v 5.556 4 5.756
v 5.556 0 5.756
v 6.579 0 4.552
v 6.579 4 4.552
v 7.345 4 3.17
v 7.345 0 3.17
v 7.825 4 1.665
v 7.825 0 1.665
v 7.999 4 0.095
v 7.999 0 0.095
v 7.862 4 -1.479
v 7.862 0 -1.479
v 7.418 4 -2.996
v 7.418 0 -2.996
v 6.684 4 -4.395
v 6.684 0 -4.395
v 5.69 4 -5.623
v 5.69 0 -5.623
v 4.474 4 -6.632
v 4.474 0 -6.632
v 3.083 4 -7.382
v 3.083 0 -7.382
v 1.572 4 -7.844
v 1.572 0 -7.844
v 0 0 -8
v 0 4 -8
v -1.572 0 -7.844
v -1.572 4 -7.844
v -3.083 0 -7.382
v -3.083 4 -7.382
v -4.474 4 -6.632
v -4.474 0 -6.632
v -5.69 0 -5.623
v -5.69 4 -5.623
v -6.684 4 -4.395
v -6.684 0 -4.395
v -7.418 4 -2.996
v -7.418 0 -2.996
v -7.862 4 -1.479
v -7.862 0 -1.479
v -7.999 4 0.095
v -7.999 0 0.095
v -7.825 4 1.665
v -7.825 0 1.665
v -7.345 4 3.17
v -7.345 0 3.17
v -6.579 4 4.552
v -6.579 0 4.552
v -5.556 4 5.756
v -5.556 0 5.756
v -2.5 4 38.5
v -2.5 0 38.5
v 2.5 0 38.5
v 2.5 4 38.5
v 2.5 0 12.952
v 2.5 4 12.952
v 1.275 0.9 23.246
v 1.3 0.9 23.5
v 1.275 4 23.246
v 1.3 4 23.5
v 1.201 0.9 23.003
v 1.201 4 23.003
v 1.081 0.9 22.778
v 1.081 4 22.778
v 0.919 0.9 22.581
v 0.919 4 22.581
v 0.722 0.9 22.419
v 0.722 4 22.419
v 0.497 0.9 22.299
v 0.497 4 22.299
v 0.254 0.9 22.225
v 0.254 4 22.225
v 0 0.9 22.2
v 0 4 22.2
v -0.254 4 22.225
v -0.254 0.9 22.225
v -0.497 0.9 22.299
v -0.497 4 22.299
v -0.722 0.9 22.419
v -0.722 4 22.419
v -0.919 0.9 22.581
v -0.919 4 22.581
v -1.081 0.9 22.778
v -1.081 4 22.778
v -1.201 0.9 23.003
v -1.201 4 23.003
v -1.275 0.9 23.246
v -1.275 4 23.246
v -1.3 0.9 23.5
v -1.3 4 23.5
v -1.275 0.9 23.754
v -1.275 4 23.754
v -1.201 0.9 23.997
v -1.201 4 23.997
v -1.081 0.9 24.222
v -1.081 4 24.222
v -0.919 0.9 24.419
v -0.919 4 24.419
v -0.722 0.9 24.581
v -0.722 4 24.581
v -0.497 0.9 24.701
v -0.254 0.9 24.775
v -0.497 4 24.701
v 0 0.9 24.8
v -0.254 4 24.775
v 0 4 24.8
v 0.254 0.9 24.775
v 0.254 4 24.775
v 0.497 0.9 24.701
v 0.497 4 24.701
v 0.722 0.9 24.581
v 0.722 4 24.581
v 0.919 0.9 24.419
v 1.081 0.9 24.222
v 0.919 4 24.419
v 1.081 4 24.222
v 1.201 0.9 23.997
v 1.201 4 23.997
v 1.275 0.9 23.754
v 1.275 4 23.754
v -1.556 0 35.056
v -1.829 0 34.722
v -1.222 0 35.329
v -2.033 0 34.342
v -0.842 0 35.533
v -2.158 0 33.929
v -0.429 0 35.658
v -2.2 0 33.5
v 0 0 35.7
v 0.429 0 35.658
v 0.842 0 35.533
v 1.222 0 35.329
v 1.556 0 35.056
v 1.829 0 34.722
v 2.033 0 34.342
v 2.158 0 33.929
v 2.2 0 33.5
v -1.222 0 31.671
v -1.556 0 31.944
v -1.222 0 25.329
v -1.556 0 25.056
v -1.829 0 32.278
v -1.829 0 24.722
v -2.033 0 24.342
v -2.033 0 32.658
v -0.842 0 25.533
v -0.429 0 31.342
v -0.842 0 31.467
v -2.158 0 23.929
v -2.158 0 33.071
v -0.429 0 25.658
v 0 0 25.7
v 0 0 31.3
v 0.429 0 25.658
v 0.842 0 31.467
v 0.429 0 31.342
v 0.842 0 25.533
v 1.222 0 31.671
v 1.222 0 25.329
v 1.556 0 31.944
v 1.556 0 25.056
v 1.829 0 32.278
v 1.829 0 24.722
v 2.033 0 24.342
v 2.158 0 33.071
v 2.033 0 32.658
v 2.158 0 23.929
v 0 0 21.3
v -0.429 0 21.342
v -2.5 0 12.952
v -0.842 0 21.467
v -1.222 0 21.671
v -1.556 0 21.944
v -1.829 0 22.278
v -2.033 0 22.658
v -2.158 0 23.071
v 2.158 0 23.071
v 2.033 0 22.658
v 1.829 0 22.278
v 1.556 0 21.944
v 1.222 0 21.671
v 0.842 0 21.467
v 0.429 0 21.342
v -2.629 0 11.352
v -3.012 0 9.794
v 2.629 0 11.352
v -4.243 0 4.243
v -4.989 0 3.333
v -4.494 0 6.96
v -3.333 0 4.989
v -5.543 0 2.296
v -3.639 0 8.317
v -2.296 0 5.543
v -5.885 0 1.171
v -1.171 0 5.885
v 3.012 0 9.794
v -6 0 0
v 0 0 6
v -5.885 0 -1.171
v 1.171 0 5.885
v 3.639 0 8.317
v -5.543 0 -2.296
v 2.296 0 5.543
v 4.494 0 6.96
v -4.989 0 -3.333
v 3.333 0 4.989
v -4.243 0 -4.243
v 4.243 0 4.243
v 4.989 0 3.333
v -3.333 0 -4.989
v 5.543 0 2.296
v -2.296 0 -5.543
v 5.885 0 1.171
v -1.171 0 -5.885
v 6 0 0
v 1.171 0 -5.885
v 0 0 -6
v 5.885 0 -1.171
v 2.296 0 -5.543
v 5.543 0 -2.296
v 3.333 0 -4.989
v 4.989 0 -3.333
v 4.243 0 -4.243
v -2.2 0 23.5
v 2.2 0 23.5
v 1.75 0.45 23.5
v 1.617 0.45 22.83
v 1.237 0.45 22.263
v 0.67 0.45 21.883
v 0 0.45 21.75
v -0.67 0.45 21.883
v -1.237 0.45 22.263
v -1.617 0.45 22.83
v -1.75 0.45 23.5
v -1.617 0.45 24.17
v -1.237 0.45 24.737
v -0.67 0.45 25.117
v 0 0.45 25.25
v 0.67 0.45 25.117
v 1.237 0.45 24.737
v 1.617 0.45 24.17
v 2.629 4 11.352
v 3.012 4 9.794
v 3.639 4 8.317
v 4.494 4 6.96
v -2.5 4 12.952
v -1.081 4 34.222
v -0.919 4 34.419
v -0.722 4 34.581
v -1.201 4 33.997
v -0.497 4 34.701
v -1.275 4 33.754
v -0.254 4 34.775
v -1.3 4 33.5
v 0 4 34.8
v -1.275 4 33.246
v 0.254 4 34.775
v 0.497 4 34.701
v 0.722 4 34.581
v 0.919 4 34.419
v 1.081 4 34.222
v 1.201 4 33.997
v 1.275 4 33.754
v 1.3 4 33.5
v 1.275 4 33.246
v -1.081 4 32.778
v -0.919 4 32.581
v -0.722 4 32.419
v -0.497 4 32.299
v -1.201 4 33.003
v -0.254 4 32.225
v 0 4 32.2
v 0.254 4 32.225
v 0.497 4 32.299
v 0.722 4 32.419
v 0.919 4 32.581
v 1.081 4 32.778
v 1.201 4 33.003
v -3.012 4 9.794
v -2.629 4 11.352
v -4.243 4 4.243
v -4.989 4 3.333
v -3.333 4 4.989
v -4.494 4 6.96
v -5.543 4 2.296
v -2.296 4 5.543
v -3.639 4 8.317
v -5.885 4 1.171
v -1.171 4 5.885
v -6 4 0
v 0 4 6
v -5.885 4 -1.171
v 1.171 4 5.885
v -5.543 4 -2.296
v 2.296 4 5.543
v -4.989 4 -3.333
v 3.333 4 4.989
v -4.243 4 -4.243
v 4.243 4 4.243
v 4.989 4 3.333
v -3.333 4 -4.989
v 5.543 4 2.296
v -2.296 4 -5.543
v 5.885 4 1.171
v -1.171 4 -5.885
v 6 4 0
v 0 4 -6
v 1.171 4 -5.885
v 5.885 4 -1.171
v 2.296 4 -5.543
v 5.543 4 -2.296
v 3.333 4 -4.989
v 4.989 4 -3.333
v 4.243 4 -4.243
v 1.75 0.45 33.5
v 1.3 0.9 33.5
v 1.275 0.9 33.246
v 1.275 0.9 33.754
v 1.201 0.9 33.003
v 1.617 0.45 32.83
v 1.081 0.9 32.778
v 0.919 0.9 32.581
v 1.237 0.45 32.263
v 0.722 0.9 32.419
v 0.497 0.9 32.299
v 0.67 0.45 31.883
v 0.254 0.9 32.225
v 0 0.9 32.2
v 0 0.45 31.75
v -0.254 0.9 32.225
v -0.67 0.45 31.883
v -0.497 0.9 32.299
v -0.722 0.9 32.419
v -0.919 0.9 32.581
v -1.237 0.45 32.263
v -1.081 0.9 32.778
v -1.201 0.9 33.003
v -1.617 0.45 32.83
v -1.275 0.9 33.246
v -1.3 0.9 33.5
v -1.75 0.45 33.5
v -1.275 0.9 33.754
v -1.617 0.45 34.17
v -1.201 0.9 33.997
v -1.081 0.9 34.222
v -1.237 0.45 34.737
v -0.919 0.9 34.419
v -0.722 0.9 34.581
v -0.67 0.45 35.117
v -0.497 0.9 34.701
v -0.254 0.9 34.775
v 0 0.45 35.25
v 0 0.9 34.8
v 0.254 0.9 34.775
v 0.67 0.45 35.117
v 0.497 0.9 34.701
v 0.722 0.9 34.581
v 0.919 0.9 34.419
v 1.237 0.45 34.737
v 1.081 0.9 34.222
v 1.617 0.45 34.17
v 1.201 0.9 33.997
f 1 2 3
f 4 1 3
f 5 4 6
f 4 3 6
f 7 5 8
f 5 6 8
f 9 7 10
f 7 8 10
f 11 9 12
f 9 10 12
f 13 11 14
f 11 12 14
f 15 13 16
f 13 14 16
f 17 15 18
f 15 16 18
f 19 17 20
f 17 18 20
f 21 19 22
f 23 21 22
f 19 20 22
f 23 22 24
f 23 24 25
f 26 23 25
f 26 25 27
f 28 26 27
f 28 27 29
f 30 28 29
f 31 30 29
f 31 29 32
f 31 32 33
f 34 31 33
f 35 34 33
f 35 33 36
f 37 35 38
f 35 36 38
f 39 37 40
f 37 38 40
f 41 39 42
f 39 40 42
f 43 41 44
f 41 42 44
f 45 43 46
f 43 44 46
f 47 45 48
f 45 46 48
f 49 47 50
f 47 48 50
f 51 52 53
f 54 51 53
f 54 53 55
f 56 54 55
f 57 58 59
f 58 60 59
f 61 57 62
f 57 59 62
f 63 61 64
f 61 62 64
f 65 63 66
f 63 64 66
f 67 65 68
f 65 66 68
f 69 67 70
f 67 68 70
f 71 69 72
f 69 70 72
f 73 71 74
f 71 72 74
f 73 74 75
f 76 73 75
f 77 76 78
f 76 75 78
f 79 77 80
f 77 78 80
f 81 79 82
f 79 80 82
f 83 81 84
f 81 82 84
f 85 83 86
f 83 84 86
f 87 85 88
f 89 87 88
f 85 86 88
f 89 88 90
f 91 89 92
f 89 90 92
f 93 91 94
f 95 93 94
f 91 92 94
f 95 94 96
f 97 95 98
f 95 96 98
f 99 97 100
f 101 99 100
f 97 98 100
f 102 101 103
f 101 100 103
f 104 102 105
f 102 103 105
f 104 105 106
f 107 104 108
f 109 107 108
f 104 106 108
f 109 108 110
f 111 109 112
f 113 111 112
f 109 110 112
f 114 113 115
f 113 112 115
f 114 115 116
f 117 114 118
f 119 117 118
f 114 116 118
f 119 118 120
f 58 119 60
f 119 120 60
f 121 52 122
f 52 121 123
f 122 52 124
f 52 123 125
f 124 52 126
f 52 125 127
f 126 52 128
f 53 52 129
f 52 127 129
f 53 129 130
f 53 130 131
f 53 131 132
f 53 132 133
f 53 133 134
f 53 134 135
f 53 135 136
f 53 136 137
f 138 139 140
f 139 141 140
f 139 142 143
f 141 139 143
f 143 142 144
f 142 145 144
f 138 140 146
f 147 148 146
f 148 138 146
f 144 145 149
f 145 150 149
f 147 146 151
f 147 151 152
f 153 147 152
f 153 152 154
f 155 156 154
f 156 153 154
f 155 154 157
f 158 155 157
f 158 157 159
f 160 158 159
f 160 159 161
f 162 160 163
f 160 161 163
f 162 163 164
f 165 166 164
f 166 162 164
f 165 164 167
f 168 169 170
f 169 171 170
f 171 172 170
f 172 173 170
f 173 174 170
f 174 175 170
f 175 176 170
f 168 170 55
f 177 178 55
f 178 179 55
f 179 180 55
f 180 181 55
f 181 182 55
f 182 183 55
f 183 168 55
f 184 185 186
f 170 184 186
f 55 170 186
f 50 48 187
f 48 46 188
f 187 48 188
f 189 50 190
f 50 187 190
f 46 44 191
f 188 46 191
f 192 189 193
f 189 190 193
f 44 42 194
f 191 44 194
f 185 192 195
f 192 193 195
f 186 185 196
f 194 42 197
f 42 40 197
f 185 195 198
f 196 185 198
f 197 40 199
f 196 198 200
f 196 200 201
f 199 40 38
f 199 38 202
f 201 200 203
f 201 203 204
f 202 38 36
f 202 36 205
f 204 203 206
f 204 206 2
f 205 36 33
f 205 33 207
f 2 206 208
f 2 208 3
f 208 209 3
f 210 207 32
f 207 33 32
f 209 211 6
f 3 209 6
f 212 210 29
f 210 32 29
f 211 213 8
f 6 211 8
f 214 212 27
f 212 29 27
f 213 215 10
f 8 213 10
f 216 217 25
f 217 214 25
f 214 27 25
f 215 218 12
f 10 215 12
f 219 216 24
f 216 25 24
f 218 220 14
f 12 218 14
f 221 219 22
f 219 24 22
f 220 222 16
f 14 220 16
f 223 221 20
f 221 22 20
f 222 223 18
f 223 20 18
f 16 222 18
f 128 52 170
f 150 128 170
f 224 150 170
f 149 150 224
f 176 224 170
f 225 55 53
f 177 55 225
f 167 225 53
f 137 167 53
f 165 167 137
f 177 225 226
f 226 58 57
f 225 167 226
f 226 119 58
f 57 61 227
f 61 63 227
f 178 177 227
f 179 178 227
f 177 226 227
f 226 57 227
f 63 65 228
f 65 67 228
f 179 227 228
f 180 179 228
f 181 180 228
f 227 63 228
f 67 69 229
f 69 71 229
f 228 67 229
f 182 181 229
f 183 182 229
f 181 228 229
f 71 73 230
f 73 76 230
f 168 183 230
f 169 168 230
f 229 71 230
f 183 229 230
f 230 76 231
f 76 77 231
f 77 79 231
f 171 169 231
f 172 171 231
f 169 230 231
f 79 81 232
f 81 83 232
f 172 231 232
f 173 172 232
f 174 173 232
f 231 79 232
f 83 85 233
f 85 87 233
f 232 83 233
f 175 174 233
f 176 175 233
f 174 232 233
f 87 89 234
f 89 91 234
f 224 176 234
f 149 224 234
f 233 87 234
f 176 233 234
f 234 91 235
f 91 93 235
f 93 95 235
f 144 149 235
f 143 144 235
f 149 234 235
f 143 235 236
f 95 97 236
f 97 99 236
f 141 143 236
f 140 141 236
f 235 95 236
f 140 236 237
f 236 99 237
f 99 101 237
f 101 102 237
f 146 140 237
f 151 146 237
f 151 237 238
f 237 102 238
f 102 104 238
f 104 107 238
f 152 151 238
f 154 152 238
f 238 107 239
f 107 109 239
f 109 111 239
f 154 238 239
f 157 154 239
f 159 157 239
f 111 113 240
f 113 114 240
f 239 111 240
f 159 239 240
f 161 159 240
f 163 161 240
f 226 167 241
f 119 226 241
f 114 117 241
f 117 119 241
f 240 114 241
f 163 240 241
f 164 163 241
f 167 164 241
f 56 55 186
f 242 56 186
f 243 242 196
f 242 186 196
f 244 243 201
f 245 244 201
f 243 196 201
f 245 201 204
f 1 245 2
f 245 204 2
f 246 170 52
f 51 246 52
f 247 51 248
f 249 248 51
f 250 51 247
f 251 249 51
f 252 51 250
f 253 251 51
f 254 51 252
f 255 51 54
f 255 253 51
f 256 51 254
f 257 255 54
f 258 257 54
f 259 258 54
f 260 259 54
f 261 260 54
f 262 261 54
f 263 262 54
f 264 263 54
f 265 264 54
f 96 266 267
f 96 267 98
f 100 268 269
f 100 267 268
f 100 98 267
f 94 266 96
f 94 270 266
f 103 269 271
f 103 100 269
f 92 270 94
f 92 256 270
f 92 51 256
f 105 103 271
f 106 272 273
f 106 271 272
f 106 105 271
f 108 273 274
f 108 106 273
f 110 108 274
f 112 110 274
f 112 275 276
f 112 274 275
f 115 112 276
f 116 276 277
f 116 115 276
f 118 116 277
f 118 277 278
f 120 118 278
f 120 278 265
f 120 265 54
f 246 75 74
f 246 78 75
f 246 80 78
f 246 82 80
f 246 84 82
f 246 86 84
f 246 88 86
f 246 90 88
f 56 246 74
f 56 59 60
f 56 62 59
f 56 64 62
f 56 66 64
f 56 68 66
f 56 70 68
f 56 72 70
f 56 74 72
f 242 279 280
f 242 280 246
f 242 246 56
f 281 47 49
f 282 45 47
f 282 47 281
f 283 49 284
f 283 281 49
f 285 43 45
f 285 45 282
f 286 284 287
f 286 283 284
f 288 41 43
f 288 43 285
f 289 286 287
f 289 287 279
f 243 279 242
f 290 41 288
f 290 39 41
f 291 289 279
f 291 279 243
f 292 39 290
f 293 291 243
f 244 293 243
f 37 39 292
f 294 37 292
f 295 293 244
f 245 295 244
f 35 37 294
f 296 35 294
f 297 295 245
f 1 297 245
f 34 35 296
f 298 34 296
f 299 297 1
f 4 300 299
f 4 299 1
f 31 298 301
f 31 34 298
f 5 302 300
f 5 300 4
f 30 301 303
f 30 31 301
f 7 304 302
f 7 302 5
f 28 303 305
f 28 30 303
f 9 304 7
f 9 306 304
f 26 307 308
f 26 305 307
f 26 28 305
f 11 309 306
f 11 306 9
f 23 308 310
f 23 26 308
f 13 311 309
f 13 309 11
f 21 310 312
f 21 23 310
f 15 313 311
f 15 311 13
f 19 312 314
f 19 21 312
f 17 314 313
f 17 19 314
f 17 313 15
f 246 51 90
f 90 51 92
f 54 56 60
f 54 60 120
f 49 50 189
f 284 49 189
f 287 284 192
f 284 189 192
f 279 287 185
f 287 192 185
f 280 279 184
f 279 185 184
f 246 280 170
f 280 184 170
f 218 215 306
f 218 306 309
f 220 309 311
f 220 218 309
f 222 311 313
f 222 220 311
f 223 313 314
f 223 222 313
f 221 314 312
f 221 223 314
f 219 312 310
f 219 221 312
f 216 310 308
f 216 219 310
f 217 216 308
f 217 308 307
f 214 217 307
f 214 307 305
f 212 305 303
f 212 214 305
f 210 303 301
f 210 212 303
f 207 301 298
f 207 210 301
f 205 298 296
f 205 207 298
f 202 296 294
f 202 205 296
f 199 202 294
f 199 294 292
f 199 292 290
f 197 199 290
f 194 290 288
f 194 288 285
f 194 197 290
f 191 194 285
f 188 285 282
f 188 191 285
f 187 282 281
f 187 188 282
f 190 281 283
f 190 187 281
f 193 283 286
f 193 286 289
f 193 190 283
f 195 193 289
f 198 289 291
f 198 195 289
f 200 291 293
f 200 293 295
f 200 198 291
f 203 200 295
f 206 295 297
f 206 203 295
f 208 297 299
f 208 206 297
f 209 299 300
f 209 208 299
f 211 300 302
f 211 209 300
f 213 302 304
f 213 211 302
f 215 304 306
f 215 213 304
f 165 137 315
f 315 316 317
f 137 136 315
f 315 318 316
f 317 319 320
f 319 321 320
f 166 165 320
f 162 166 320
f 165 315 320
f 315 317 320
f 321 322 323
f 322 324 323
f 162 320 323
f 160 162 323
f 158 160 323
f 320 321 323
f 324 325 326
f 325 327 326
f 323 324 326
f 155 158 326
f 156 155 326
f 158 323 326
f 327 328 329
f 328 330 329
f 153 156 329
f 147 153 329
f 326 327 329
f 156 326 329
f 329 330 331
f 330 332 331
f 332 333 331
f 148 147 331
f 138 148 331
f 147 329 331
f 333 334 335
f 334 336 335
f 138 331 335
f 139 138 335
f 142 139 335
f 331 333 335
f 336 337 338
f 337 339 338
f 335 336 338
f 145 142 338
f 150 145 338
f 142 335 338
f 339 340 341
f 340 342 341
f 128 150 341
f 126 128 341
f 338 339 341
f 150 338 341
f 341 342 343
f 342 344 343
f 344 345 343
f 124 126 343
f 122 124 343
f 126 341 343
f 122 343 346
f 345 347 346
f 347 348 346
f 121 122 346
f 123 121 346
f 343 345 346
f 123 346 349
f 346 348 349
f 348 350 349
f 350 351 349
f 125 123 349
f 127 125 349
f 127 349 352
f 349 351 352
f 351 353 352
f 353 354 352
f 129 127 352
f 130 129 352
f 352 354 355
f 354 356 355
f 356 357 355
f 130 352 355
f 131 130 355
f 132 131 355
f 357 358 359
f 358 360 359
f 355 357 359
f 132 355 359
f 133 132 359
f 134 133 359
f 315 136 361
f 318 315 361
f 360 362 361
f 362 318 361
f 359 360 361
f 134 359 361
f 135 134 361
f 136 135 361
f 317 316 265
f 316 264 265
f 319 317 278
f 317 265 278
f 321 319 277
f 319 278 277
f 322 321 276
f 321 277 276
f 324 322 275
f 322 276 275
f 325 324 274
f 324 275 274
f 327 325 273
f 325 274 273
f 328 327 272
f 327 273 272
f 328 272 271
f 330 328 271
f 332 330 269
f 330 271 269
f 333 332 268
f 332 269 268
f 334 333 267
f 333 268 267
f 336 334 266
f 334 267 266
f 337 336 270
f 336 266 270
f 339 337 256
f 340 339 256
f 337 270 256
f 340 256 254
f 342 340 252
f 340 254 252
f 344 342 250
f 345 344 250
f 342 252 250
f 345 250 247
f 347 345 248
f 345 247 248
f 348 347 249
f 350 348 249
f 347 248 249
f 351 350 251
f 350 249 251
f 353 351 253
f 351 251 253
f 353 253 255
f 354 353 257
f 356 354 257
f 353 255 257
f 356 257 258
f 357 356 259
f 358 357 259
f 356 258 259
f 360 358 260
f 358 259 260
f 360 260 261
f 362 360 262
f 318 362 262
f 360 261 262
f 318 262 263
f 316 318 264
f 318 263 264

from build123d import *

# Parameters (mm, degrees)
SKETCH1_R                                       = 6
BOSS_EXTRUDE1_DEPTH                             = 4
CSK_FOR_M2_FLAT_HEAD_MACHINE_SCREW1_D           = 2.6
CSK_FOR_M2_FLAT_HEAD_MACHINE_SCREW1_CSINK_D     = 4.4
CSK_FOR_M2_FLAT_HEAD_MACHINE_SCREW1_CSINK_ANGLE = 90


with BuildPart() as part:
    # Sketch1 → Boss-Extrude1 (new body)
    with BuildSketch(Plane(origin=(0, 0, 0), x_dir=(1, 0, 0), z_dir=(0, 1, 0))):
        with BuildLine():
            Line((-2.5, -12.951833847), (-2.5, -38.5))
            Line((-2.5, -38.5), (2.5, -38.5))
            Line((2.5, -38.5), (2.5, -12.951833847))
            ThreePointArc((2.5, -12.951833847), (3.295532486, -9.043154047), (5.555555556, -5.756370599))
            ThreePointArc((5.555555556, -5.756370599), (0, 8), (-5.555555556, -5.756370599))
            ThreePointArc((-5.555555556, -5.756370599), (-3.295532486, -9.043154047), (-2.5, -12.951833847))
        make_face()
        Circle(SKETCH1_R, mode=Mode.SUBTRACT)
    extrude(amount=BOSS_EXTRUDE1_DEPTH)

    # CSK for M2 Flat Head Machine Screw1 (through all)
    with Locations(Plane(origin=(0, 0, 0), x_dir=(-1, 0, 0), z_dir=(0, -1, 0))):
        with Locations((0, -23.5), (0, -33.5)):
            CounterSinkHole(CSK_FOR_M2_FLAT_HEAD_MACHINE_SCREW1_D / 2, CSK_FOR_M2_FLAT_HEAD_MACHINE_SCREW1_CSINK_D / 2, counter_sink_angle=CSK_FOR_M2_FLAT_HEAD_MACHINE_SCREW1_CSINK_ANGLE)


solid = part.part
